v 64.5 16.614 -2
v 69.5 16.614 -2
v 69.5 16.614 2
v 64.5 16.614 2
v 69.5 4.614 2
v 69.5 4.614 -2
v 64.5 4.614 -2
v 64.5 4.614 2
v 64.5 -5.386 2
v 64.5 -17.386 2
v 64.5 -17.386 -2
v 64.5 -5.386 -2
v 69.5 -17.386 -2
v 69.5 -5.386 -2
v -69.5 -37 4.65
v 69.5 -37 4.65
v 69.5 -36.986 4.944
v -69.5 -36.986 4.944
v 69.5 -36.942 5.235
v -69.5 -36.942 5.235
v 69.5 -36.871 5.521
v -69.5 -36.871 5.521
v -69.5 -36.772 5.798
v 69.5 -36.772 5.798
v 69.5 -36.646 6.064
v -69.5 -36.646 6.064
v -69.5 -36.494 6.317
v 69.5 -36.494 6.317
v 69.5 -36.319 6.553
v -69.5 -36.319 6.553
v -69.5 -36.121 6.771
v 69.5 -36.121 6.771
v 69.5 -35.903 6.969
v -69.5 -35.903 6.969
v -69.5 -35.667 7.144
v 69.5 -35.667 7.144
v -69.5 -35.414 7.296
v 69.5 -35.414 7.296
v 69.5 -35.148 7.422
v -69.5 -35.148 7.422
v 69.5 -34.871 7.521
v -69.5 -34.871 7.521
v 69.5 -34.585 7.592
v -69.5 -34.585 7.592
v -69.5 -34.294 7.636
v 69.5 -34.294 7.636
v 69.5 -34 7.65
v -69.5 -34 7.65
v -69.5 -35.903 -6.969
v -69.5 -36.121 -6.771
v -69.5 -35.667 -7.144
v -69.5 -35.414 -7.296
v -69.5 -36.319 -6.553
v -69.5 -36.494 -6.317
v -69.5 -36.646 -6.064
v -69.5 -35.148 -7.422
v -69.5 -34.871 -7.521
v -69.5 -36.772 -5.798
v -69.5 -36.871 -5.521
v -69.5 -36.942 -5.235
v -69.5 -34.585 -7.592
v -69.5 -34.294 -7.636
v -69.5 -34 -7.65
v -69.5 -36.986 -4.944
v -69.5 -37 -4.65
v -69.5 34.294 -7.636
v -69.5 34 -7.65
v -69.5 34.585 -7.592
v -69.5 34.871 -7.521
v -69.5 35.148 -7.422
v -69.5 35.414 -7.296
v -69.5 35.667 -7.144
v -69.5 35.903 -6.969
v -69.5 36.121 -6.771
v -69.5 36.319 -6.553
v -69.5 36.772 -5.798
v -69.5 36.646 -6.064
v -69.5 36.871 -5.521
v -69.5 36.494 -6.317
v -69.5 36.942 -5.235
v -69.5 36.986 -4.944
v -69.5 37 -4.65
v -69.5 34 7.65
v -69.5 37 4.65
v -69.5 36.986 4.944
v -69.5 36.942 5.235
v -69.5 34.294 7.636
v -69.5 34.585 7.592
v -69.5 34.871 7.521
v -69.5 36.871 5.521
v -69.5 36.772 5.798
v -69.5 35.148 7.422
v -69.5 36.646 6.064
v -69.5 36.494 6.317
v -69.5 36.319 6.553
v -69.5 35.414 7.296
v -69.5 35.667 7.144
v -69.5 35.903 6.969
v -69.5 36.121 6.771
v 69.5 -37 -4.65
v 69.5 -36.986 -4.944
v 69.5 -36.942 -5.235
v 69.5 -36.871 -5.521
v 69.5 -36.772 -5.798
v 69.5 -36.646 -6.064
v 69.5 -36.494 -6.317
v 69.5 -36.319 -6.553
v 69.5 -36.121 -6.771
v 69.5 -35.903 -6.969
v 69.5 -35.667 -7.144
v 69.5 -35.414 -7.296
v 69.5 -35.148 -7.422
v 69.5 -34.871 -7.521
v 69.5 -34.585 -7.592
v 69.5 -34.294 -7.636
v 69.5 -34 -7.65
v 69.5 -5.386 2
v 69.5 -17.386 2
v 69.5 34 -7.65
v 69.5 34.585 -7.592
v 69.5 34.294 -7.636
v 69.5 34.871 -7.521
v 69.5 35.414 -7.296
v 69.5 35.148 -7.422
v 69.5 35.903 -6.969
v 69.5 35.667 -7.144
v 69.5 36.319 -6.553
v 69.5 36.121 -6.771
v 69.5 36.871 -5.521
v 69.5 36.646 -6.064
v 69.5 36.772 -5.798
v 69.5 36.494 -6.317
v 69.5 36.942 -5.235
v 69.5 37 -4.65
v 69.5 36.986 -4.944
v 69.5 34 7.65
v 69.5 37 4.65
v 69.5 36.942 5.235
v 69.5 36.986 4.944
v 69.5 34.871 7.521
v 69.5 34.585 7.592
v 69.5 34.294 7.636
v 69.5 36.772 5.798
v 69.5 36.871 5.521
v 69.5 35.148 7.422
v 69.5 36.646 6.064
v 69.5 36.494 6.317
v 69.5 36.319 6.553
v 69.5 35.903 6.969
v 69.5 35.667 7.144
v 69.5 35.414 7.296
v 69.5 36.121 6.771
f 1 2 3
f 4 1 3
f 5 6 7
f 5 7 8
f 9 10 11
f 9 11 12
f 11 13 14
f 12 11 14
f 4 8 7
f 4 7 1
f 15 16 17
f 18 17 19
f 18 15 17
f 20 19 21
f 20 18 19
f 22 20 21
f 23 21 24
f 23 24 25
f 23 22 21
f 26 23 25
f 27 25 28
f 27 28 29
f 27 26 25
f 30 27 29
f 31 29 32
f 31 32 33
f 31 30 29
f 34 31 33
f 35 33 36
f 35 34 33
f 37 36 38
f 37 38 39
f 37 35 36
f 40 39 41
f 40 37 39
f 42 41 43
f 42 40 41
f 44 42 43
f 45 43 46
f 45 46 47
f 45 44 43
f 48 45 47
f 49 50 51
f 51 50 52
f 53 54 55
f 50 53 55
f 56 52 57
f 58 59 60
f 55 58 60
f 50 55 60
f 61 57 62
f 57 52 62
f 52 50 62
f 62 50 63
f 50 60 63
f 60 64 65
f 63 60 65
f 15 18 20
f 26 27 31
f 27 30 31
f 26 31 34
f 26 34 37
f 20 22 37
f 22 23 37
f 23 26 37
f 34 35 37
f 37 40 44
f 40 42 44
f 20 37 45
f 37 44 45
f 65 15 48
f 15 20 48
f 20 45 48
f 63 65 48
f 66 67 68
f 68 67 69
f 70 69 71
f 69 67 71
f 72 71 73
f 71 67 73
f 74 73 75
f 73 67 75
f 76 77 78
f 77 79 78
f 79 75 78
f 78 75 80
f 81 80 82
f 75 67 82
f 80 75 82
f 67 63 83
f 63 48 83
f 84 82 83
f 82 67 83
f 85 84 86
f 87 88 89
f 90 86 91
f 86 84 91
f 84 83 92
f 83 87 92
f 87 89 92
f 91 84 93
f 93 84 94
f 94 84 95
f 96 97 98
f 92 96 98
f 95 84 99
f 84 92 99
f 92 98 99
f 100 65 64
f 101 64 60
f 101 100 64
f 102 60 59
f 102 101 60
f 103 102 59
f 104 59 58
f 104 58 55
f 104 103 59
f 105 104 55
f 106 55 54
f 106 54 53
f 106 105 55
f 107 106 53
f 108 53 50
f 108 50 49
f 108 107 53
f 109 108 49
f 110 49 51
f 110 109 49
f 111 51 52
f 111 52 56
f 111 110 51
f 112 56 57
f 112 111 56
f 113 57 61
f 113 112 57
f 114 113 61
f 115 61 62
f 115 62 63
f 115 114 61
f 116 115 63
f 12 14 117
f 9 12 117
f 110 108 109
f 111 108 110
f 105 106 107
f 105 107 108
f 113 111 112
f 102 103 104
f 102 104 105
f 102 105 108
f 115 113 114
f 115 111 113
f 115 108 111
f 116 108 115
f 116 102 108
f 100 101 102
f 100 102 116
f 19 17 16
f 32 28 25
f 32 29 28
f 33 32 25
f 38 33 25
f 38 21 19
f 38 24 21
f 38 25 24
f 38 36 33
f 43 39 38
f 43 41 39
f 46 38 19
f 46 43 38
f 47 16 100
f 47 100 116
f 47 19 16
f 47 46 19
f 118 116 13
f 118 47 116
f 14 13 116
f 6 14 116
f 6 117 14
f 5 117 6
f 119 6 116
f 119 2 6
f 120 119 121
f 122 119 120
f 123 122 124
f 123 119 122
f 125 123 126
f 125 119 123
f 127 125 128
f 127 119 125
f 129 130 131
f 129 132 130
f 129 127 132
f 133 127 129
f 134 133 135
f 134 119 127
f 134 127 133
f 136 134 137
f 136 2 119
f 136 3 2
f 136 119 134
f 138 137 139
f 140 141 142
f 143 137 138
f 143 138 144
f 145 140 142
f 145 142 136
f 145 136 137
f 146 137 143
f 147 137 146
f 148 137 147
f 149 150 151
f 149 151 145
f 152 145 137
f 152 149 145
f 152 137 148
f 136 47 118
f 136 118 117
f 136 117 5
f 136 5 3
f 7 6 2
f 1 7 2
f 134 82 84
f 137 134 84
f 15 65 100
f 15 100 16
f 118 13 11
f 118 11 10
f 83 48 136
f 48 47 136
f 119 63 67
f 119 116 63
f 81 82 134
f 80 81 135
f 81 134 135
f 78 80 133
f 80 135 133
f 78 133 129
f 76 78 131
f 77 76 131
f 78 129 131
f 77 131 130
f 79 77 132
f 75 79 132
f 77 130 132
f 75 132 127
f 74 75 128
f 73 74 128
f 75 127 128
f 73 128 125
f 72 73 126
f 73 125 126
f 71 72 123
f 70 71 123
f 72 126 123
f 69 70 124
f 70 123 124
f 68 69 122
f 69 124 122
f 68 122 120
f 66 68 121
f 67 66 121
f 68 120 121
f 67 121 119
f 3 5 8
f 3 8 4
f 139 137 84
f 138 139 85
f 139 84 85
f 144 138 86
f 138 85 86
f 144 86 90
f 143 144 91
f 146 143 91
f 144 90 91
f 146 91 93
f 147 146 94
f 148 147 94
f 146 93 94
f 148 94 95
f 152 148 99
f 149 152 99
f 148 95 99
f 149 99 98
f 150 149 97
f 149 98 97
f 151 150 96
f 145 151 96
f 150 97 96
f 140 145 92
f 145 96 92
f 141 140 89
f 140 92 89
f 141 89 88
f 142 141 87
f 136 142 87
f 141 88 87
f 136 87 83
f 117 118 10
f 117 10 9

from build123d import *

# Parameters (mm, degrees)
F0_W     = 74
F0_H     = 15.3
F1_DEPTH = 69.5
F2_R     = 3
F3_W     = 12
F3_H     = 4
F4_DEPTH = 5


with BuildPart() as f1:
    # F0 (on Right) → F1 (new body, symmetric)
    with BuildSketch(Plane.YZ):
        Rectangle(F0_W, F0_H)
    extrude(amount=F1_DEPTH, both=True)

    # F2
    f2_edges = [f1.edges().sort_by_distance(p)[0] for p in [
        (0, -37, 7.65),
        (0, 37, 7.65),
        (0, 37, -7.65),
        (0, -37, -7.65),
    ]]
    fillet(f2_edges, radius=F2_R)

    # F3 (on face) → F4 (cut)
    with BuildSketch(Plane.YZ.offset(69.5)):
        with Locations((10.614212, 0)):
            Rectangle(F3_W, F3_H)
        with Locations((-11.385788, 0)):
            Rectangle(F3_W, F3_H)
    extrude(amount=-F4_DEPTH, mode=Mode.SUBTRACT)


solid = f1.part
